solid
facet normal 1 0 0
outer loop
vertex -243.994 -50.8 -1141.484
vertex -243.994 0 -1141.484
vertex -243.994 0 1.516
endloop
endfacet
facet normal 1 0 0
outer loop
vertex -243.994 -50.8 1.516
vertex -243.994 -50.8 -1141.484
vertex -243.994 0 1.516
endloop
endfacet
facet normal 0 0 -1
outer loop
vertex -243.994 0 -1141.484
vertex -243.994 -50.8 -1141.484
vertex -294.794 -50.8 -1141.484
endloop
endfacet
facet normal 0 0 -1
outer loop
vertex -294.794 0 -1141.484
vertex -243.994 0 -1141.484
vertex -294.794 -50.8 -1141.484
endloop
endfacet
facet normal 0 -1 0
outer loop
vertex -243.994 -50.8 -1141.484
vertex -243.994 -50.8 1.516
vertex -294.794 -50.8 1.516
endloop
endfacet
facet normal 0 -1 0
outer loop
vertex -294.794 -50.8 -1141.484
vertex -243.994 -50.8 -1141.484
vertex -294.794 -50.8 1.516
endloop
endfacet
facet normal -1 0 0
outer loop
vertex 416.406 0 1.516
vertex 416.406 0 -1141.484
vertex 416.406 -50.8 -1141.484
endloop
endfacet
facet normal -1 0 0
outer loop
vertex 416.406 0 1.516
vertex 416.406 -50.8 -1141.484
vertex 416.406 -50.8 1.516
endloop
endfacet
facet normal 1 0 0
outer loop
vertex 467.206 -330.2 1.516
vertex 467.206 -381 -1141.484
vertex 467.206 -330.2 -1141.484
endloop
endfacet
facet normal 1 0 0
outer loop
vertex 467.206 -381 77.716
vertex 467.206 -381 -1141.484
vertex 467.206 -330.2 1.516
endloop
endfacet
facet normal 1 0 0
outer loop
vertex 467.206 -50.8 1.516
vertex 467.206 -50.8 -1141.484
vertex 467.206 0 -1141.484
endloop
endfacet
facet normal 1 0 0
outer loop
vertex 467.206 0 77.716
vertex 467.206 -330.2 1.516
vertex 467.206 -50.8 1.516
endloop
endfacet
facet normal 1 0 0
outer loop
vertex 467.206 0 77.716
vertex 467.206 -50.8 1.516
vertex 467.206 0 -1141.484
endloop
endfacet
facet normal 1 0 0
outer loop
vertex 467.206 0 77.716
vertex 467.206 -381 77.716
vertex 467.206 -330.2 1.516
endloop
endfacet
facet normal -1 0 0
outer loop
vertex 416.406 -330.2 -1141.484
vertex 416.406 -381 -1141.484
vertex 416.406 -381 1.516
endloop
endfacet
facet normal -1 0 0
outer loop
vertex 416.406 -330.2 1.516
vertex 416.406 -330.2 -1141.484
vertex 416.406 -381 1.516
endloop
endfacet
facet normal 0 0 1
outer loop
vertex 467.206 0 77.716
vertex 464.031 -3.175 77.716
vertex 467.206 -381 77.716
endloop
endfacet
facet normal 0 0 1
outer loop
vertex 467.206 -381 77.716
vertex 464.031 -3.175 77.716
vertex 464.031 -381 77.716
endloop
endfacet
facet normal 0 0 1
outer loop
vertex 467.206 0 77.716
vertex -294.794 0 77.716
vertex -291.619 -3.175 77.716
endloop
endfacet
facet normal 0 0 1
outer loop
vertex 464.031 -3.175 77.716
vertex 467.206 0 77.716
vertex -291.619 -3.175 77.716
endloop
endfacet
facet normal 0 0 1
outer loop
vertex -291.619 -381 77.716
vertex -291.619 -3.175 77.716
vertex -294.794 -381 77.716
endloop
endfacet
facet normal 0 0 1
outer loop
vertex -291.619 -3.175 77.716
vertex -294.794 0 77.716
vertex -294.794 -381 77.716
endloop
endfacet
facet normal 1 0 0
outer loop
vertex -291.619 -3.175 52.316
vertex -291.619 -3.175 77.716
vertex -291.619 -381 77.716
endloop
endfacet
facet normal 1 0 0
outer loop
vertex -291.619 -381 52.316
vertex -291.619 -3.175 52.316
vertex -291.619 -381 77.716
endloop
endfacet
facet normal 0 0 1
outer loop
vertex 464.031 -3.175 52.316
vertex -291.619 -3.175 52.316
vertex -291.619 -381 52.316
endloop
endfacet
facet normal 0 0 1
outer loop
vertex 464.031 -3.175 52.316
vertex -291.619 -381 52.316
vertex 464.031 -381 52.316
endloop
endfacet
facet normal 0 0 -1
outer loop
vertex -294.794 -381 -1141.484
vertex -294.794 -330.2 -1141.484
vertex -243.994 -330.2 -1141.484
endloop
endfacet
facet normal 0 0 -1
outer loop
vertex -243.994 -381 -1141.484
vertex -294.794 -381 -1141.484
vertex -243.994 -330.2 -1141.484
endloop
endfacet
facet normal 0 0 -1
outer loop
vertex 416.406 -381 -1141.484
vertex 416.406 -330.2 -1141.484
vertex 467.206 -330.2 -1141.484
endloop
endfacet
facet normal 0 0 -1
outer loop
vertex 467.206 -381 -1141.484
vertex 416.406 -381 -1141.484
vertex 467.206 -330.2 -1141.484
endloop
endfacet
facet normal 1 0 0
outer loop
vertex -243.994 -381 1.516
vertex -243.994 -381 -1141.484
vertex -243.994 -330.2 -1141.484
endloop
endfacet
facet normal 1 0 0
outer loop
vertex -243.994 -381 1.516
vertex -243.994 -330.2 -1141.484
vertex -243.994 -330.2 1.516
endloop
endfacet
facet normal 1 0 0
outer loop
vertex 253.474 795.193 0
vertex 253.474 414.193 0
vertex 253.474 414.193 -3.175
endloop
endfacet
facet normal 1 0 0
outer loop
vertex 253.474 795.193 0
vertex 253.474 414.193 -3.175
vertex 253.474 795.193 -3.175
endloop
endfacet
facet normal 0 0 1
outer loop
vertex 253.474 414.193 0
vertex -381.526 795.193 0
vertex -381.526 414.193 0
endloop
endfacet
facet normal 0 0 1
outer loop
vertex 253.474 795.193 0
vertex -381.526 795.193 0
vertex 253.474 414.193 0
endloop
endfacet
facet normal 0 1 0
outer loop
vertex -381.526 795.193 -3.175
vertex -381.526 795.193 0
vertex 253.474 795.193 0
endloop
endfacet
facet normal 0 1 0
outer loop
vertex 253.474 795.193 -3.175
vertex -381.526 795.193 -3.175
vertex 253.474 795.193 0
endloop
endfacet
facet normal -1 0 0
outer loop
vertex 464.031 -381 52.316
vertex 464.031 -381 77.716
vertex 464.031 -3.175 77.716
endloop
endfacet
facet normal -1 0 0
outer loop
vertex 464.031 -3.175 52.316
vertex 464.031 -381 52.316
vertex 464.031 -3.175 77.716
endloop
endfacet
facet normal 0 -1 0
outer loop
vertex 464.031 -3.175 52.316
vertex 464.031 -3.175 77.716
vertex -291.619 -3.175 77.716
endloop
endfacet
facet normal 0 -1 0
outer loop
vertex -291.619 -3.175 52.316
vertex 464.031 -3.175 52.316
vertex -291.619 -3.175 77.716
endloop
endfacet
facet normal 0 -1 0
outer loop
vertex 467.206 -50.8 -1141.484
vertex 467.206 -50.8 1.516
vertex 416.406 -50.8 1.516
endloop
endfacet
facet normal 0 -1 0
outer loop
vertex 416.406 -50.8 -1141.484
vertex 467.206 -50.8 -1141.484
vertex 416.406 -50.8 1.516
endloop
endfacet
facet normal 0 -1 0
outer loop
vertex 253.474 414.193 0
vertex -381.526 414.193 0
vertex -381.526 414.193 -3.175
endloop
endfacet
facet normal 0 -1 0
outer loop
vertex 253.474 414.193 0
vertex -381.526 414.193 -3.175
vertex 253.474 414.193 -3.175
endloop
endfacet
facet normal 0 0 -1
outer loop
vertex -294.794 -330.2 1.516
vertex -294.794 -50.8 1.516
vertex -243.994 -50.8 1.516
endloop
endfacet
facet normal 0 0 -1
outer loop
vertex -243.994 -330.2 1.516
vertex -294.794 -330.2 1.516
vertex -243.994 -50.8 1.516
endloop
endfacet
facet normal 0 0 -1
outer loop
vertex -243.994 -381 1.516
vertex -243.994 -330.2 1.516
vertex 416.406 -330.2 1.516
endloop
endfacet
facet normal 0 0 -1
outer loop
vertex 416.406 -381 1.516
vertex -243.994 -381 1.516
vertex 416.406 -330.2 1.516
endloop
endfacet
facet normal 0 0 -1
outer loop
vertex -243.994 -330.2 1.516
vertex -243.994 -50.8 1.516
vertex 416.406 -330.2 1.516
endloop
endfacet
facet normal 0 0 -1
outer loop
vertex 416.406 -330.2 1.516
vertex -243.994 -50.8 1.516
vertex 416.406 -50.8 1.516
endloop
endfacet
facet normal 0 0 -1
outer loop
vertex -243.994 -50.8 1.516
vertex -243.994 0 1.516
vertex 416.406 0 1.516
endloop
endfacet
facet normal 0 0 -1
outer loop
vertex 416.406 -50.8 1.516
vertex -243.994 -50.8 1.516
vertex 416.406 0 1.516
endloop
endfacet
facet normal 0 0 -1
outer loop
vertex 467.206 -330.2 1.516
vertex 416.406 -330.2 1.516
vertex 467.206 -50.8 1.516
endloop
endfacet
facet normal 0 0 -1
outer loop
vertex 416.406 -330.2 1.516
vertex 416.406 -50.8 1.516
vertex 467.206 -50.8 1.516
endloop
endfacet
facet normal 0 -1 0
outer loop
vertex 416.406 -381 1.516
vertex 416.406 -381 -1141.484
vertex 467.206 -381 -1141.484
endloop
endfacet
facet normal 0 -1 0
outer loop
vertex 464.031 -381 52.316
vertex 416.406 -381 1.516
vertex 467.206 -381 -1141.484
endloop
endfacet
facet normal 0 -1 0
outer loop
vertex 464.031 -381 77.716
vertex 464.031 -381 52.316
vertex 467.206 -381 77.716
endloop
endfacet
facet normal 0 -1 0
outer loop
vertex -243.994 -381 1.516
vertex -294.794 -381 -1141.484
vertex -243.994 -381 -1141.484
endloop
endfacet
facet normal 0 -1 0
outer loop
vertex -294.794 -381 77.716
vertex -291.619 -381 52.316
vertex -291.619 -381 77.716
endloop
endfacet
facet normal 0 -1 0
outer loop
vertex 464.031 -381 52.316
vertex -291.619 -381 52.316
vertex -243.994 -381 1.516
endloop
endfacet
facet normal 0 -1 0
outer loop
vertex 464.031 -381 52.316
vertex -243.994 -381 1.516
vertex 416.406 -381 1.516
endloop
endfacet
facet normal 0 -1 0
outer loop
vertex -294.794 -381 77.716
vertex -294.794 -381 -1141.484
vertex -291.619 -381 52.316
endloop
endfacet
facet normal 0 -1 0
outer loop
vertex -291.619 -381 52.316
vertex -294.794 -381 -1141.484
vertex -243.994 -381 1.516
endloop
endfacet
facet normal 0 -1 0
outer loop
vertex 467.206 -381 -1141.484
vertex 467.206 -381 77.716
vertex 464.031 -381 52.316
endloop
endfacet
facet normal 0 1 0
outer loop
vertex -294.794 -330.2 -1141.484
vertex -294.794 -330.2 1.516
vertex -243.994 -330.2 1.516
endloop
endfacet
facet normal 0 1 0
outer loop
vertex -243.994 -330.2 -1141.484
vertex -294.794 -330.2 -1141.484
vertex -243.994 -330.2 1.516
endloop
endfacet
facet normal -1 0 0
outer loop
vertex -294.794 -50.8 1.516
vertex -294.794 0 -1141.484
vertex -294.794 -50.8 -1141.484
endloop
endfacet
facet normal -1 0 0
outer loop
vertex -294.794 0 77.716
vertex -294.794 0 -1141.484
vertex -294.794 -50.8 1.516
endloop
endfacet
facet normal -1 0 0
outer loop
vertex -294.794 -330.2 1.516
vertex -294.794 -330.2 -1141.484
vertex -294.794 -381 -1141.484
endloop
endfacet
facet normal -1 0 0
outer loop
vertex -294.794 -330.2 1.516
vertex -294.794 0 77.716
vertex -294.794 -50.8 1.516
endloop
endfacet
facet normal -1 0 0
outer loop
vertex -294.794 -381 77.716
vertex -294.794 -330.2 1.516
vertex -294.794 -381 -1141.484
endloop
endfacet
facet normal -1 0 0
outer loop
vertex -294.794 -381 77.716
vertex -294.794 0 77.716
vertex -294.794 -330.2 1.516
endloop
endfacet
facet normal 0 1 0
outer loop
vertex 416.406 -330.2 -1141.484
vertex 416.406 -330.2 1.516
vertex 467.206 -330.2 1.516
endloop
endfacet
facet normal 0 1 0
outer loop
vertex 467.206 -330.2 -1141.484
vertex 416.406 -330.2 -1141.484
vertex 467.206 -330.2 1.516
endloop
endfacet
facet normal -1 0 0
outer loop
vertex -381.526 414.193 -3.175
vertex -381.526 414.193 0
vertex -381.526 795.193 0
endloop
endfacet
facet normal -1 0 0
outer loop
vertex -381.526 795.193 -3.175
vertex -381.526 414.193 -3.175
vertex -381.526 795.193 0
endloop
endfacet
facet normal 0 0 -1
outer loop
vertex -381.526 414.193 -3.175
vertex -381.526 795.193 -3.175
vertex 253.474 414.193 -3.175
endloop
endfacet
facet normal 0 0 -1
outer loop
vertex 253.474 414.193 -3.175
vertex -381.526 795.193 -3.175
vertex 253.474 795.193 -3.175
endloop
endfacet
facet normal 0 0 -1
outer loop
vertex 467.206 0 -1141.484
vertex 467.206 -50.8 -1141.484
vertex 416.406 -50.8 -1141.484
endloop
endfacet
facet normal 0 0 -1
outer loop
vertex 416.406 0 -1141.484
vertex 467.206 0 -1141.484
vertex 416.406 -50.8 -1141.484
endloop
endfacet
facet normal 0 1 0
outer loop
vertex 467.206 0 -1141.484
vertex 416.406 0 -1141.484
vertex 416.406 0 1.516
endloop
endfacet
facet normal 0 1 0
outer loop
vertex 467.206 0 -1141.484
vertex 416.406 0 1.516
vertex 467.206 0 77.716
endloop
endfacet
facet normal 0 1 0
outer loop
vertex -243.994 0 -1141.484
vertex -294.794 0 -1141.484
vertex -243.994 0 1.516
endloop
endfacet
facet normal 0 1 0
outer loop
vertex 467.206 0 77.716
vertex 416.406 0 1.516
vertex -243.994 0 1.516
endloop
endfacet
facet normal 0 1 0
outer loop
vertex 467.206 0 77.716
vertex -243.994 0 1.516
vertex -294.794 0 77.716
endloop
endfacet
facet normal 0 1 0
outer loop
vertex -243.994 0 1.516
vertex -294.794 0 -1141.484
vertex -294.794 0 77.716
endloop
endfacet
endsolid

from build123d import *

# Parameters (mm, degrees)
F0_W      = 762
F0_H      = 50.8
F1_DEPTH  = 381
F2_W      = 50.8
F2_H      = 1143
F3_DEPTH  = 50.8
F4_W      = 50.8
F4_H      = 1143
F5_DEPTH  = 50.8
F6_W      = 381
F6_H      = 25.4
F7_DEPTH  = 3.175
F8_W      = 3.175
F8_H      = 25.4
F9_DEPTH  = 3.175
F10_W     = 755.65
F10_H     = 25.4
F11_DEPTH = 3.175
F12_W     = 377.825
F12_H     = 25.4
F13_DEPTH = 3.175
F14_DEPTH = 3.175
F16_W     = 3.175
F16_H     = 25.4
F17_DEPTH = 3.175
F18_W     = 635
F18_H     = 381
F19_DEPTH = 3.175


with BuildPart() as f1:
    # F0 (on Front) → F1 (new body)
    with BuildSketch(Plane.XZ):
        with Locations((86.2060026343, 26.915807277)):
            Rectangle(F0_W, F0_H)
    extrude(amount=F1_DEPTH)

    # F2 (on face) → F3 (join)
    with BuildSketch(Plane.XZ.offset(381)):
        with Locations((-269.3939973657, -569.984192723)):
            Rectangle(F2_W, F2_H)
        with Locations((441.8060026343, -569.984192723)):
            Rectangle(F2_W, F2_H)
    extrude(amount=-F3_DEPTH)

    # F4 (on face) → F5 (join)
    with BuildSketch(Plane(origin=(0, 0, 0), x_dir=(-1, 0, 0), z_dir=(0, 1, 0))):
        with Locations((-441.8060026343, -569.984192723)):
            Rectangle(F4_W, F4_H)
        with Locations((269.3939973657, -569.984192723)):
            Rectangle(F4_W, F4_H)
    extrude(amount=-F5_DEPTH)

    # F6 (on face) → F7 (join)
    with BuildSketch(Plane.YZ.offset(467.2060026343)):
        with Locations((-190.5, 65.015807277)):
            Rectangle(F6_W, F6_H)
    extrude(amount=-F7_DEPTH)

    # F8 (on face) → F9 (join)
    with BuildSketch(Plane(origin=(0, 0, 0), x_dir=(-1, 0, 0), z_dir=(0, 1, 0))):
        with Locations((-465.6185026343, 65.015807277)):
            Rectangle(F8_W, F8_H)
    extrude(amount=-F9_DEPTH)

    # F10 (on face) → F11 (join)
    with BuildSketch(Plane(origin=(0, 0, 0), x_dir=(-1, 0, 0), z_dir=(0, 1, 0))):
        with Locations((-86.2060026343, 65.015807277)):
            Rectangle(F10_W, F10_H)
    extrude(amount=-F11_DEPTH)

    # F12 (on face) → F13 (join)
    with BuildSketch(Plane(origin=(-294.7939973657, 0, 0), x_dir=(0, -1, 0), z_dir=(-1, 0, 0))):
        with Locations((192.0875, 65.015807277)):
            Rectangle(F12_W, F12_H)
    extrude(amount=-F13_DEPTH)

    # F14 (add): a face of the model
    f14_faces = [f1.faces().sort_by_distance(p)[0] for p in [
        (464.0310026343, -192.0875, 65.015807277),
    ]]
    extrude(f14_faces, amount=-F14_DEPTH)

    # F16 (on face) → F17 (join)
    with BuildSketch(Plane(origin=(-294.7939973657, 0, 0), x_dir=(0, -1, 0), z_dir=(-1, 0, 0))):
        with Locations((1.5875, 65.015807277)):
            Rectangle(F16_W, F16_H)
    extrude(amount=-F17_DEPTH)


with BuildPart() as f19:
    # F18 (on Top) → F19 (new body)
    with BuildSketch(Plane.XY):
        with Locations((-64.0264371872, 604.693302393)):
            Rectangle(F18_W, F18_H)
    extrude(amount=-F19_DEPTH)


solid = Compound([f1.part, f19.part])
